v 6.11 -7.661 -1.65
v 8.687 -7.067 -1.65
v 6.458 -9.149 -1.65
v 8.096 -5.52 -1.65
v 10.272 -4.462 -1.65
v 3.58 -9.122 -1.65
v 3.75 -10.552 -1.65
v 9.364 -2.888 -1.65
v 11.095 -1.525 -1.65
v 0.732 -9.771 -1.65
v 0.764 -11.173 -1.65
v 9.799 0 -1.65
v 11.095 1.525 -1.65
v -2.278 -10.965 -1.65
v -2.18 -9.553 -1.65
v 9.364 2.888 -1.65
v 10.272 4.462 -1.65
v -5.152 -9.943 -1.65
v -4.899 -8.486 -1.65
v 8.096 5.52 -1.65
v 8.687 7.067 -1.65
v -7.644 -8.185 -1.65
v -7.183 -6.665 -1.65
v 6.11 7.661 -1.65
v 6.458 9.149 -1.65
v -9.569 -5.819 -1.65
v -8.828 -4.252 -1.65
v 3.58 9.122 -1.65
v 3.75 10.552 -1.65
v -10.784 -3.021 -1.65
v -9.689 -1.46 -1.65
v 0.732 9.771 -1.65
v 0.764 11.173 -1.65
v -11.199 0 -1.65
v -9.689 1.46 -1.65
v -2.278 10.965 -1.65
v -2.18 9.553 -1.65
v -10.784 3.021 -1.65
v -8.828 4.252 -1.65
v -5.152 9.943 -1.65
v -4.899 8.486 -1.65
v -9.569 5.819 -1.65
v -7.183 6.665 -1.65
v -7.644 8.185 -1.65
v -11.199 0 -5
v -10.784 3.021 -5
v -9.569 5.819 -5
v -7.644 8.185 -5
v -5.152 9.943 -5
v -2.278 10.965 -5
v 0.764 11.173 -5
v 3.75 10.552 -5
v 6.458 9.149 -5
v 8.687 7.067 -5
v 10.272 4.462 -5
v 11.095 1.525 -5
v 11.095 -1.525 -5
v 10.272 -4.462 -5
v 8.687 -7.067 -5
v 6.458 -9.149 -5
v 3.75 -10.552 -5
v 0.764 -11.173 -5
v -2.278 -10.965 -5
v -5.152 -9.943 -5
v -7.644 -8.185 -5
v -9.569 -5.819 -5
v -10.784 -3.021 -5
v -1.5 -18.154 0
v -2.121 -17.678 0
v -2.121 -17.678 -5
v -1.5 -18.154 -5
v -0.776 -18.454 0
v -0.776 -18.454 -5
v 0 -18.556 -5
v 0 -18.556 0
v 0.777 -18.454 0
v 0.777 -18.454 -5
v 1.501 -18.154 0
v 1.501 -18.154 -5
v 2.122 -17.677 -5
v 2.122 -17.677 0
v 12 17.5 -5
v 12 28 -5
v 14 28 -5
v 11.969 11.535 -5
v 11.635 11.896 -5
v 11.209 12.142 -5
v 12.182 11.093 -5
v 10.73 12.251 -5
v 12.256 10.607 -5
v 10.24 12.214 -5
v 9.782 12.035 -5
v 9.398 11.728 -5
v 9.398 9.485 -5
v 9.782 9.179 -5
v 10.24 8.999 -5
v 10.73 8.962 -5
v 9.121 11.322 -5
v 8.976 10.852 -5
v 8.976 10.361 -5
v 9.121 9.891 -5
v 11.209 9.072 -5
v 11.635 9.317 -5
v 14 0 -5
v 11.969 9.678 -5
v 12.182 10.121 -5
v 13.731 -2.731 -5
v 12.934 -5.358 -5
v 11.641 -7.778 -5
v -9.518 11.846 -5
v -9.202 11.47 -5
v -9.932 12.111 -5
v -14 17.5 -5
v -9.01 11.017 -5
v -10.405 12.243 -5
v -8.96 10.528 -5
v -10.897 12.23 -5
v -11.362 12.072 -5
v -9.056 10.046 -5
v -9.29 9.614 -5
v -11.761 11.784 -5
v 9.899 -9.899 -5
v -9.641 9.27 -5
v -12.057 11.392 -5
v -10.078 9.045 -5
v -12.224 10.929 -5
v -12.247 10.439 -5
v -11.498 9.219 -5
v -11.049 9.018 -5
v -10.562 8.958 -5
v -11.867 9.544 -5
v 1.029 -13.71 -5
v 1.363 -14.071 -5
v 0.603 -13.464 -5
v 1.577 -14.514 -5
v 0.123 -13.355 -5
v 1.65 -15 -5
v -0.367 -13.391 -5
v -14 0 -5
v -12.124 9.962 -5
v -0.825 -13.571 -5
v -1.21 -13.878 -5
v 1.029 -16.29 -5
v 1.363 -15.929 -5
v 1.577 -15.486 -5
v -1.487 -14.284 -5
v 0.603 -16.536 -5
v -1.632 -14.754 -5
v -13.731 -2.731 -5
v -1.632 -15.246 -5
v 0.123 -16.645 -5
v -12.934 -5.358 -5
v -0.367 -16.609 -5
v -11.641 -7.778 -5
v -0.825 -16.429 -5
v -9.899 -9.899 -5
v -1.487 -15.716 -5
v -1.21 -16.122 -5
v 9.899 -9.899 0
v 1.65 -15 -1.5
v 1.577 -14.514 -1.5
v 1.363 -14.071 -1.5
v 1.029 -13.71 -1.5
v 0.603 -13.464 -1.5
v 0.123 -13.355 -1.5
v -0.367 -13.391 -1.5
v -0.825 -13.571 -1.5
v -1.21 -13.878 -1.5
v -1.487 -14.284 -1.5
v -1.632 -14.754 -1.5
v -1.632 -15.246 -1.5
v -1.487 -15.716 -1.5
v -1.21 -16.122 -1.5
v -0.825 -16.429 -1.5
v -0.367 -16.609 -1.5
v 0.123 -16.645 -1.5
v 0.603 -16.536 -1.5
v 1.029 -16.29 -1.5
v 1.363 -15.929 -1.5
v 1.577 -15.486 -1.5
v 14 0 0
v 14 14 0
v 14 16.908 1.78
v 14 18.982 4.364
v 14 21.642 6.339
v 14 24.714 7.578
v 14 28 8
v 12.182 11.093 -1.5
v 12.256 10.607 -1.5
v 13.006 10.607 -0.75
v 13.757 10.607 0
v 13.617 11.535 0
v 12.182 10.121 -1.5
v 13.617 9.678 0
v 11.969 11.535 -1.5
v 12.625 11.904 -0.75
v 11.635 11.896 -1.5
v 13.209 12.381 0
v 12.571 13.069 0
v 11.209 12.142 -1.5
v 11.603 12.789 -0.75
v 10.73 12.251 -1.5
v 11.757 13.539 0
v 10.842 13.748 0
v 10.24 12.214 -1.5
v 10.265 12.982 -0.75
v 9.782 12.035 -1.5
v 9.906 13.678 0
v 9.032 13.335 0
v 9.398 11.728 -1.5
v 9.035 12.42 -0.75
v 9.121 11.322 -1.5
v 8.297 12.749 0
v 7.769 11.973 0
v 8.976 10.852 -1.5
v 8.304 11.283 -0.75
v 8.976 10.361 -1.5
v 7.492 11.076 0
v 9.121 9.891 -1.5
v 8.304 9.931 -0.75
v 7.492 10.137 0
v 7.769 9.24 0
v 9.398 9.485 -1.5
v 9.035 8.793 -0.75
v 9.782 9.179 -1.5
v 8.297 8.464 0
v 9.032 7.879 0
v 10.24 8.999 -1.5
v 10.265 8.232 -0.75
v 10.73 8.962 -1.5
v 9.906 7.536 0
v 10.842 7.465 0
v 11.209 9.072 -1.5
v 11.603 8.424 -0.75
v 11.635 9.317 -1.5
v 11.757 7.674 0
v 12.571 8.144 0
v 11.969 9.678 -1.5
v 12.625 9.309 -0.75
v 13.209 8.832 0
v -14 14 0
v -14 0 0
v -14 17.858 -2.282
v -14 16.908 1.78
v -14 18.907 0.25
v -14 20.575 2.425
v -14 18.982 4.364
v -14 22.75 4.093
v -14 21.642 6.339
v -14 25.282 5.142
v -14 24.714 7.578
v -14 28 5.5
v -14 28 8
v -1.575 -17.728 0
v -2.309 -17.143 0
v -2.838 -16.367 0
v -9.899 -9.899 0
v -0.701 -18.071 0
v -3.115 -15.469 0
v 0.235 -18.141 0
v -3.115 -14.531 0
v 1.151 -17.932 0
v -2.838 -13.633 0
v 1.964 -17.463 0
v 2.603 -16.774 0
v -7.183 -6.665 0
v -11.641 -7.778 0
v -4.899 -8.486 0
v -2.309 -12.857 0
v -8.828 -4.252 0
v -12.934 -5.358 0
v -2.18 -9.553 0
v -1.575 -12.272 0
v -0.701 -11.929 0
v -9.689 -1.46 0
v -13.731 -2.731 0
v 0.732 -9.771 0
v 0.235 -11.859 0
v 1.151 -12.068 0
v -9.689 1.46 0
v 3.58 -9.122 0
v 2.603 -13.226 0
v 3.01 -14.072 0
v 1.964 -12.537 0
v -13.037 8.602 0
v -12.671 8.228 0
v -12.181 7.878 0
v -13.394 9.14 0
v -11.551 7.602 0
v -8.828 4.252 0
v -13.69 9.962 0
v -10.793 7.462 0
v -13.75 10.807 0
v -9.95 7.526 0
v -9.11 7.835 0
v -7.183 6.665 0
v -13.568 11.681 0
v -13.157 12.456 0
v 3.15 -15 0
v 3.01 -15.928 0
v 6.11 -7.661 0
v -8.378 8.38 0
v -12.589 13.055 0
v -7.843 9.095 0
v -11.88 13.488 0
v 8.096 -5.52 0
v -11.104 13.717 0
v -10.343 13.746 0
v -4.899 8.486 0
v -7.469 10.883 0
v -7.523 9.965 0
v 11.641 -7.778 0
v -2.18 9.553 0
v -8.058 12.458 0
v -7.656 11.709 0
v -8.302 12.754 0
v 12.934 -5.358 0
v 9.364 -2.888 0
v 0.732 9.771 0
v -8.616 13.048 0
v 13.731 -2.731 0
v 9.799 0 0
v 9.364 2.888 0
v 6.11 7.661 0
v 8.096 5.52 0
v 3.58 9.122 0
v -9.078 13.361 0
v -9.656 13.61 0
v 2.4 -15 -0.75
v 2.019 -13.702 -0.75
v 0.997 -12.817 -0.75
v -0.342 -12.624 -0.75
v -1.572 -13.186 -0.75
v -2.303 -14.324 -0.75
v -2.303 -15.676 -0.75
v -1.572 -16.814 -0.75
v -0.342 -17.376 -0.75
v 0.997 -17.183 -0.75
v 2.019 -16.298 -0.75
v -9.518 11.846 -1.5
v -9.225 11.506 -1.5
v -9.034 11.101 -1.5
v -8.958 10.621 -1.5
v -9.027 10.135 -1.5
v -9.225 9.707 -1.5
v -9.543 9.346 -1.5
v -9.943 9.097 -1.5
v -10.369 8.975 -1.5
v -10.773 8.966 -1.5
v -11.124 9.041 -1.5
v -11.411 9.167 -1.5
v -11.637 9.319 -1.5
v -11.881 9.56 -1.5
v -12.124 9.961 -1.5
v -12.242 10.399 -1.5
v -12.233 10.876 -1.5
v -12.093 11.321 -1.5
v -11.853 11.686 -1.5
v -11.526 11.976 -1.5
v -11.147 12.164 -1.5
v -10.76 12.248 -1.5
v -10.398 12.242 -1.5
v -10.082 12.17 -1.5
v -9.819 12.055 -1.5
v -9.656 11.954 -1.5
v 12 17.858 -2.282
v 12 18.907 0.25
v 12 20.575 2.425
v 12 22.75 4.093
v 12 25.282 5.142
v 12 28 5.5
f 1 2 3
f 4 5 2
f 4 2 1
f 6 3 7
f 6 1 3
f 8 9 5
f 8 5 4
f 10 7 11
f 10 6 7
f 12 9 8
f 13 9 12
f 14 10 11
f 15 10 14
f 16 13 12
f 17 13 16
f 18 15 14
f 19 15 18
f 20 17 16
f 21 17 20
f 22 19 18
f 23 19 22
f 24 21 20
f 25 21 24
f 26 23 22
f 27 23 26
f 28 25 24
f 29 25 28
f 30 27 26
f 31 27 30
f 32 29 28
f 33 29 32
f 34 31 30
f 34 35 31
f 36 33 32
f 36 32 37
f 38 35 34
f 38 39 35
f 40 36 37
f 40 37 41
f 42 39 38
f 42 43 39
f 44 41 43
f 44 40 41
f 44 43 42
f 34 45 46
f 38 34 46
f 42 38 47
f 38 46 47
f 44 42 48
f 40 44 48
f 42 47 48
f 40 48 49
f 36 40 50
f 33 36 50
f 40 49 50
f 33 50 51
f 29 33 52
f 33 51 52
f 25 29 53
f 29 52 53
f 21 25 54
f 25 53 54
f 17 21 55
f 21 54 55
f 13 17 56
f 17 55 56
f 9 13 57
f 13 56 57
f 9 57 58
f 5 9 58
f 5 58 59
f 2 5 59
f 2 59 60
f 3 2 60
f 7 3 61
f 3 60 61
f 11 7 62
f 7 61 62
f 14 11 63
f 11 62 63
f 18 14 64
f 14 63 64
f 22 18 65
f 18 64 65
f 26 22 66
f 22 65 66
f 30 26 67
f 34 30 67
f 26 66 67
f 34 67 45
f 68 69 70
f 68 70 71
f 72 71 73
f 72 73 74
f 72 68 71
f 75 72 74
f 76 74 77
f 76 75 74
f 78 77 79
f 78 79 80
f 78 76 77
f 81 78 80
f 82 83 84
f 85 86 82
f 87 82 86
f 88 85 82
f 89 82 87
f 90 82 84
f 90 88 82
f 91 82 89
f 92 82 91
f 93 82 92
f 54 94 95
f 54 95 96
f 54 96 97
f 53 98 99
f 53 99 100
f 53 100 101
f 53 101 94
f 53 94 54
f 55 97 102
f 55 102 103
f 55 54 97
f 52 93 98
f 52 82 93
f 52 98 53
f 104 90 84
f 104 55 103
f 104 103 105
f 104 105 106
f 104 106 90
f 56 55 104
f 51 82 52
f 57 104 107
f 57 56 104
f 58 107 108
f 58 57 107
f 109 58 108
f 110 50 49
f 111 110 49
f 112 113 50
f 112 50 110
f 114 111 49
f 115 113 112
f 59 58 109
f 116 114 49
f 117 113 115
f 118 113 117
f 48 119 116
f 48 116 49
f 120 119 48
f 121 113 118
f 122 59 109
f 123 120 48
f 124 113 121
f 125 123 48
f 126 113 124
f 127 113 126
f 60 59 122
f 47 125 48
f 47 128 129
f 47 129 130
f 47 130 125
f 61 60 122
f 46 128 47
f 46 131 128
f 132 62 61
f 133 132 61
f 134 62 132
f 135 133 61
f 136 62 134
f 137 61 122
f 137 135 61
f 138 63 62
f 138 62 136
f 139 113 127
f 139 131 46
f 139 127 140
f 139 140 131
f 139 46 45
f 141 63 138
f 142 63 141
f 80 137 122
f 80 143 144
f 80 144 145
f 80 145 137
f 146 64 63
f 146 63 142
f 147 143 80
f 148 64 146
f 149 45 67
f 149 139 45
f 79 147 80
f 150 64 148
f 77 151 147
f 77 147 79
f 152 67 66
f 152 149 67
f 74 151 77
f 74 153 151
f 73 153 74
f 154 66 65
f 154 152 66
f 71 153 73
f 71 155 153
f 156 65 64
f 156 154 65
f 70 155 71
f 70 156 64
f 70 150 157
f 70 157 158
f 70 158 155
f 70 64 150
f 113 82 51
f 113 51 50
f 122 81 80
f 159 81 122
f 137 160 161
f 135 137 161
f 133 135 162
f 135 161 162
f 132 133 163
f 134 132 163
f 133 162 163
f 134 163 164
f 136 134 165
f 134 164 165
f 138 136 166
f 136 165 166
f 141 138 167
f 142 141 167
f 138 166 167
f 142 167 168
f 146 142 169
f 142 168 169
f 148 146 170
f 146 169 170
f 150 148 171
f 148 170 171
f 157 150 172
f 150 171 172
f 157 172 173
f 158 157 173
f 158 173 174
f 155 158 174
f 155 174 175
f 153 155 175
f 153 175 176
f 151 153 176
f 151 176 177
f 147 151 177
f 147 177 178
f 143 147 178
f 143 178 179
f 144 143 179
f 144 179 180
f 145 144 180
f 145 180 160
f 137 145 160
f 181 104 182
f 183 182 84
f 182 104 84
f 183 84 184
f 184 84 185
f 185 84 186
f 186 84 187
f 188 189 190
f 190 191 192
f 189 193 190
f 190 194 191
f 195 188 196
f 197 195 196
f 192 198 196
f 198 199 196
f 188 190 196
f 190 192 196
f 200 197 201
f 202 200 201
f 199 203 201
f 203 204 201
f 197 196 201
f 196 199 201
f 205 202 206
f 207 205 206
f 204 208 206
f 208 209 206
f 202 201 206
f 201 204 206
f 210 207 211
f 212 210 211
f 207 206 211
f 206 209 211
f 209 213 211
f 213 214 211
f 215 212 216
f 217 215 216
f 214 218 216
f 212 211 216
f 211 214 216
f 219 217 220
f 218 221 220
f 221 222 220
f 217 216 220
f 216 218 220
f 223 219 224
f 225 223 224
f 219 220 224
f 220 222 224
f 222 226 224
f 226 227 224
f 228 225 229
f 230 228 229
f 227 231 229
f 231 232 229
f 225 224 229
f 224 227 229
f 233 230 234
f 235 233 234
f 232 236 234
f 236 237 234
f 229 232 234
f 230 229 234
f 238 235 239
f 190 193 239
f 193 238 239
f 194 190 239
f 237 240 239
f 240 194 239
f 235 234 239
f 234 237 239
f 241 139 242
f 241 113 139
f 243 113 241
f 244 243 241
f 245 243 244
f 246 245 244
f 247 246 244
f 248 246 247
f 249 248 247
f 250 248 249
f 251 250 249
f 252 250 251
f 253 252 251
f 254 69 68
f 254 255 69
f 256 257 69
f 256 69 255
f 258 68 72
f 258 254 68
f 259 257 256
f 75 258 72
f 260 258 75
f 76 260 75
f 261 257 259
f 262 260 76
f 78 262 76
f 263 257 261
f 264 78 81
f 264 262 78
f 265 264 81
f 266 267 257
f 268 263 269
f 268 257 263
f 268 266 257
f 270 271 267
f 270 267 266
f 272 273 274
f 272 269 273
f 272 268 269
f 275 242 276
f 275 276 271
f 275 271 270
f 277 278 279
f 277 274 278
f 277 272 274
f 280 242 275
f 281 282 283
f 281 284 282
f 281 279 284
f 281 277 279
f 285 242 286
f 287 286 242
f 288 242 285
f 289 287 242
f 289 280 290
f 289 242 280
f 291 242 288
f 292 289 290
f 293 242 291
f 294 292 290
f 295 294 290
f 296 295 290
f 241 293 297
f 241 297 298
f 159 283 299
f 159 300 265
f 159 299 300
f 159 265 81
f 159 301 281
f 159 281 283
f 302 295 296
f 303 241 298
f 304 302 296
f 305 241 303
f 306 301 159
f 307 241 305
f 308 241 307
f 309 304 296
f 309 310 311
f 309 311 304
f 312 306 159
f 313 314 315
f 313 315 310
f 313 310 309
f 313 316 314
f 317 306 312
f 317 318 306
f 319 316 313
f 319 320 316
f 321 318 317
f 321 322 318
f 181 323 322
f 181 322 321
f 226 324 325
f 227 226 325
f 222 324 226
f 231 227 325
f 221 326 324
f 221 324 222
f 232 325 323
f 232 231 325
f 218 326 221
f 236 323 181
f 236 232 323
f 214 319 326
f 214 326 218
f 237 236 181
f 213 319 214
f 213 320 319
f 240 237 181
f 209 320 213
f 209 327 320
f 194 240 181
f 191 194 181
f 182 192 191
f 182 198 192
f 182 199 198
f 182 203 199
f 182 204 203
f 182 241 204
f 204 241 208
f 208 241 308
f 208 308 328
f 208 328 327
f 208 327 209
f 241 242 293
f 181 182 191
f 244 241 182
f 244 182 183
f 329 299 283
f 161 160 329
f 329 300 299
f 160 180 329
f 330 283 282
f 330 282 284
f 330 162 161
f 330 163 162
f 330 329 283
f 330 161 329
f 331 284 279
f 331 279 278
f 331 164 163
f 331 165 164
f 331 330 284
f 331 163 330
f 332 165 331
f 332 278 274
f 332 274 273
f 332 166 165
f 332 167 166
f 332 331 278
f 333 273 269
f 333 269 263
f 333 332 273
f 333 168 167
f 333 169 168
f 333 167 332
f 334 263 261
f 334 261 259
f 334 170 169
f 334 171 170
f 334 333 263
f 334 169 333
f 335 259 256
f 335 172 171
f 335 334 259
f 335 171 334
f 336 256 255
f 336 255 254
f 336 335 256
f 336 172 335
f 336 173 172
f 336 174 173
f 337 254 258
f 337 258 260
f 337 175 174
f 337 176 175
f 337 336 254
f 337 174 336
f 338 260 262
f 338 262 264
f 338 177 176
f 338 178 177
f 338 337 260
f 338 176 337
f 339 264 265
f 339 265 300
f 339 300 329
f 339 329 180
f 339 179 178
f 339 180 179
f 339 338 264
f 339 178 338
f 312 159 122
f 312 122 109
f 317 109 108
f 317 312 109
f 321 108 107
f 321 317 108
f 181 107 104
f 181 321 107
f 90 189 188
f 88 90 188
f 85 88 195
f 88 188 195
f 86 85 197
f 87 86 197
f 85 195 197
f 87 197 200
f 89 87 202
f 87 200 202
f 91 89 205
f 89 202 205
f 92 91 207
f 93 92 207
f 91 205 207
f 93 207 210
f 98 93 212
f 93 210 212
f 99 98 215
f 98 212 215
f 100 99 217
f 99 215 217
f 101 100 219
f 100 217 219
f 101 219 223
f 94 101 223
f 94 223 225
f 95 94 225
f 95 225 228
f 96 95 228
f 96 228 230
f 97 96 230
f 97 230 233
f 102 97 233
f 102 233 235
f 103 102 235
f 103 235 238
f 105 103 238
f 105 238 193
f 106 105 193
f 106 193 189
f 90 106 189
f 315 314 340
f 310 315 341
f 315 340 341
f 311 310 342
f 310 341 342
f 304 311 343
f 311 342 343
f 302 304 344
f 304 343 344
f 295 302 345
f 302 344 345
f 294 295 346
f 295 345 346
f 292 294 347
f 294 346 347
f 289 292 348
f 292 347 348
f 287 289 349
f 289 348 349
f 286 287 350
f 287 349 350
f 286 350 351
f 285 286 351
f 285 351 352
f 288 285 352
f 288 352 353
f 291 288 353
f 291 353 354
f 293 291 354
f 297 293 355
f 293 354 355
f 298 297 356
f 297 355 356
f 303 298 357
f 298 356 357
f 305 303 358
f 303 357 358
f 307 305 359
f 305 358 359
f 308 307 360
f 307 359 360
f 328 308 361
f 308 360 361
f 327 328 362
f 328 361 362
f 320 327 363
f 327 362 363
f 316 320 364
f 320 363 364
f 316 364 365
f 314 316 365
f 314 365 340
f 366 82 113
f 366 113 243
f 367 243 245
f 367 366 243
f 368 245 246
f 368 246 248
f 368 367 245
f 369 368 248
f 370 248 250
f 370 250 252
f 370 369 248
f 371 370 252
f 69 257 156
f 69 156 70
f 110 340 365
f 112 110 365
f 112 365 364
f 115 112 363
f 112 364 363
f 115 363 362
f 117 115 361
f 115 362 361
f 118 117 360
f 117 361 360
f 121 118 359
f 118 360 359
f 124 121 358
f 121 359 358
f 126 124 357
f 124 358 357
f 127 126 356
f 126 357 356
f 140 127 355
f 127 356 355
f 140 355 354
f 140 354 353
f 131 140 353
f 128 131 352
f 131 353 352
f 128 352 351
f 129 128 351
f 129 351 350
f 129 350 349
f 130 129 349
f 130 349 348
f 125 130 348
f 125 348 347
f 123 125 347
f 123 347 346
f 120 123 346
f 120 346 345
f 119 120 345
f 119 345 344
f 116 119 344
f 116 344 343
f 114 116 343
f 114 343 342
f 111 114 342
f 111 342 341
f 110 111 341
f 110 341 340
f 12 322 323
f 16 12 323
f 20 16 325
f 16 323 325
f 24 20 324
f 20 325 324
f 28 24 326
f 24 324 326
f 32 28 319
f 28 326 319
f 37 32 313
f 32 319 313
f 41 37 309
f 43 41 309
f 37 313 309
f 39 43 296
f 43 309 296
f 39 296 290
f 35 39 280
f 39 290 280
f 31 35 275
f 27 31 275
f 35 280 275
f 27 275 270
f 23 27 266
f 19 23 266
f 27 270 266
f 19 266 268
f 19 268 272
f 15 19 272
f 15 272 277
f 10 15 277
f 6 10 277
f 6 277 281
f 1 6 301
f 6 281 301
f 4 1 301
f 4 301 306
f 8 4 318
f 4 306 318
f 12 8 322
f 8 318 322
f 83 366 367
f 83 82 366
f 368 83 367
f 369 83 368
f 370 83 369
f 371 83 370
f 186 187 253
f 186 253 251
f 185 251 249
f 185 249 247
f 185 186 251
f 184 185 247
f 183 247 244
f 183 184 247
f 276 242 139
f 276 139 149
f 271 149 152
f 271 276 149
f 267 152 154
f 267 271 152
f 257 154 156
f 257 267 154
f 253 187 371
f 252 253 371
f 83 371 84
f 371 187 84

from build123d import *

# Parameters (mm, degrees)
EXTRUDE_3_DEPTH     = 5
SKETCH_1_R          = 9.79888
CUT_EXTRUDE_1_DEPTH = 1.65
SKETCH_1_9_R        = 3.15
SKETCH_3_8_R        = 1.65
SKETCH_3_9_R        = 1.648905
SKETCH_3_9_R_2      = 1.65
CUT_EXTRUDE_2_DEPTH = 5
SKETCH_10_R         = 11.19888
CUT_EXTRUDE_3_DEPTH = 3.35
EXTRUDE_4_DEPTH     = 28
EXTRUDE_5_DEPTH     = 2
EXTRUDE_6_DEPTH     = 28


with BuildPart() as part:
    # 草图7 → 凸台-拉伸3 (new body)
    with BuildSketch(Plane.XY):
        with BuildLine():
            Line((14, 14), (-14, 14))
            Line((-14, 14), (-14, 0))
            ThreePointArc((-14, 0), (-12.934313455, -5.357568053), (-9.899494937, -9.899494937))
            Line((-9.899494937, -9.899494937), (-2.121320344, -17.67766953))
            ThreePointArc((-2.121320344, -17.67766953), (0.000404905, -18.556181469), (2.121892965, -17.677096908))
            Line((2.121892965, -17.677096908), (9.899494937, -9.899494937))
            ThreePointArc((9.899494937, -9.899494937), (12.934313455, -5.357568053), (14, 0))
            Line((14, 0), (14, 14))
        make_face()
    extrude(amount=-EXTRUDE_3_DEPTH)

    # 草图1 → 切除-拉伸1 (cut)
    with BuildSketch(Plane.XY):
        Circle(SKETCH_1_R)
    extrude(amount=-CUT_EXTRUDE_1_DEPTH, mode=Mode.SUBTRACT)

    # 切除-放样1: read off the stored shape, not the designer's step
    # 切除-放样1 outline → 切除-放样1 (revolve, cut)
    with BuildSketch(Plane(origin=(10.6066, 10.606603436, 0), x_dir=(1, 0, 0), z_dir=(0, -1, 0))):
        Polygon((0, 0), (0, -1.5), (1.648905, -1.5), (3.15, 0), align=None)
    revolve(axis=Axis((10.6066, 10.606603436, 0), (0, 0, 1)), mode=Mode.SUBTRACT)

    # 切除-放样2: read off the stored shape, not the designer's step
    # 切除-放样2: loft between two sections, ruled curve by curve
    loft_2_from = [
        Edge.make_bspline([(-8.058196468, 12.45812698, 0), (-4.355149378, 7.361319916, 0), (-9.451956443, 3.658272826, 0), (-13.155003532, 8.755079891, 0), (-16.858050622, 13.851886955, 0), (-11.761243557, 17.554934045, 0), (-8.058196468, 12.45812698, 0)], [0, 0, 0, 0, 0.5, 0.5, 0.5, 1, 1, 1, 1], 3, [1, 0.333333333, 0.333333333, 1, 0.333333333, 0.333333333, 1]),
    ]
    loft_2_to = [
        Edge.make_bspline([(-9.518492924, 11.845518562, -1.5), (-7.040662671, 9.669304411, -1.5), (-9.216876823, 7.191474158, -1.5), (-11.694707076, 9.367688309, -1.5), (-14.172537329, 11.543902461, -1.5), (-11.996323177, 14.021732714, -1.5), (-9.518492924, 11.845518562, -1.5)], [0, 0, 0, 0, 0.5, 0.5, 0.5, 1, 1, 1, 1], 3, [1, 0.333333333, 0.333333333, 1, 0.333333333, 0.333333333, 1]),
    ]
    loft_2 = Solid(Shell([*[Face.make_surface_from_curves(loft_2_from[k], loft_2_to[k]) for k in range(1)], Face(Wire(loft_2_from)), Face(Wire(loft_2_to))]))
    add(loft_2, mode=Mode.SUBTRACT)

    # 草图1<9> → 切除-放样3 section 0
    with BuildSketch(Plane.XY):
        with Locations((0, -14.999996564)):
            Circle(SKETCH_1_9_R)
    # 草图3<8> → 切除-放样3 section 1
    with BuildSketch(Plane.XY.offset(-1.5)):
        with Locations((0, -14.999996564)):
            Circle(SKETCH_3_8_R)
    loft(mode=Mode.SUBTRACT)

    # 草图3<9> → 切除-拉伸2 (cut)
    with BuildSketch(Plane.XY.offset(-1.5)):
        with Locations(Location((-10.6066, 10.606603436, 0), (0, 0, 48.708))):
            Circle(SKETCH_3_9_R)
        with Locations((10.6066, 10.606603436)):
            Circle(SKETCH_3_9_R)
        with Locations((0, -14.999996564)):
            Circle(SKETCH_3_9_R_2)
    extrude(amount=-CUT_EXTRUDE_2_DEPTH, mode=Mode.SUBTRACT)

    # 草图10 → 切除-拉伸3 (cut)
    with BuildSketch(Plane(origin=(0, 0, -5), x_dir=(-1, 0, 0), z_dir=(0, 0, -1))):
        Circle(SKETCH_10_R)
    extrude(amount=-CUT_EXTRUDE_3_DEPTH, mode=Mode.SUBTRACT)



with BuildPart() as body_2:
    # 草图11 → 凸台-拉伸4 (new body)
    with BuildSketch(Plane(origin=(14, 0, 0), x_dir=(0, 0, -1), z_dir=(1, 0, 0))):
        with BuildLine():
            Line((5, 15), (5, 17.5))
            ThreePointArc((5, 17.5), (-2.424621202, 20.575378798), (-5.5, 28))
            Line((-5.5, 28), (-8, 28))
            ThreePointArc((-8, 28), (-4.192388155, 18.807611845), (5, 15))
        make_face()
    extrude(amount=-EXTRUDE_4_DEPTH)

    # 草图13 → 凸台-拉伸5 (add)
    with BuildSketch(Plane.ZY.offset(-14)):
        with BuildLine():
            Line((-5, 28), (-5, 15))
            ThreePointArc((-5, 15), (4.192388155, 18.807611845), (8, 28))
            Line((8, 28), (-5, 28))
        make_face()
    extrude(amount=EXTRUDE_5_DEPTH)


with BuildPart() as part_1:
    add(part.part)

    add(body_2.part)  # 凸台-拉伸6 merges body 2
    # 草图14 → 凸台-拉伸6 (add)
    with BuildSketch(Plane(origin=(-14, 0, 0), x_dir=(0, 0, -1), z_dir=(1, 0, 0))):
        Polygon((0, 14), (-1.780422928, 16.908297474), (5, 16.908297474), (5, 14), align=None)
    extrude(amount=EXTRUDE_6_DEPTH)


solid = part_1.part
